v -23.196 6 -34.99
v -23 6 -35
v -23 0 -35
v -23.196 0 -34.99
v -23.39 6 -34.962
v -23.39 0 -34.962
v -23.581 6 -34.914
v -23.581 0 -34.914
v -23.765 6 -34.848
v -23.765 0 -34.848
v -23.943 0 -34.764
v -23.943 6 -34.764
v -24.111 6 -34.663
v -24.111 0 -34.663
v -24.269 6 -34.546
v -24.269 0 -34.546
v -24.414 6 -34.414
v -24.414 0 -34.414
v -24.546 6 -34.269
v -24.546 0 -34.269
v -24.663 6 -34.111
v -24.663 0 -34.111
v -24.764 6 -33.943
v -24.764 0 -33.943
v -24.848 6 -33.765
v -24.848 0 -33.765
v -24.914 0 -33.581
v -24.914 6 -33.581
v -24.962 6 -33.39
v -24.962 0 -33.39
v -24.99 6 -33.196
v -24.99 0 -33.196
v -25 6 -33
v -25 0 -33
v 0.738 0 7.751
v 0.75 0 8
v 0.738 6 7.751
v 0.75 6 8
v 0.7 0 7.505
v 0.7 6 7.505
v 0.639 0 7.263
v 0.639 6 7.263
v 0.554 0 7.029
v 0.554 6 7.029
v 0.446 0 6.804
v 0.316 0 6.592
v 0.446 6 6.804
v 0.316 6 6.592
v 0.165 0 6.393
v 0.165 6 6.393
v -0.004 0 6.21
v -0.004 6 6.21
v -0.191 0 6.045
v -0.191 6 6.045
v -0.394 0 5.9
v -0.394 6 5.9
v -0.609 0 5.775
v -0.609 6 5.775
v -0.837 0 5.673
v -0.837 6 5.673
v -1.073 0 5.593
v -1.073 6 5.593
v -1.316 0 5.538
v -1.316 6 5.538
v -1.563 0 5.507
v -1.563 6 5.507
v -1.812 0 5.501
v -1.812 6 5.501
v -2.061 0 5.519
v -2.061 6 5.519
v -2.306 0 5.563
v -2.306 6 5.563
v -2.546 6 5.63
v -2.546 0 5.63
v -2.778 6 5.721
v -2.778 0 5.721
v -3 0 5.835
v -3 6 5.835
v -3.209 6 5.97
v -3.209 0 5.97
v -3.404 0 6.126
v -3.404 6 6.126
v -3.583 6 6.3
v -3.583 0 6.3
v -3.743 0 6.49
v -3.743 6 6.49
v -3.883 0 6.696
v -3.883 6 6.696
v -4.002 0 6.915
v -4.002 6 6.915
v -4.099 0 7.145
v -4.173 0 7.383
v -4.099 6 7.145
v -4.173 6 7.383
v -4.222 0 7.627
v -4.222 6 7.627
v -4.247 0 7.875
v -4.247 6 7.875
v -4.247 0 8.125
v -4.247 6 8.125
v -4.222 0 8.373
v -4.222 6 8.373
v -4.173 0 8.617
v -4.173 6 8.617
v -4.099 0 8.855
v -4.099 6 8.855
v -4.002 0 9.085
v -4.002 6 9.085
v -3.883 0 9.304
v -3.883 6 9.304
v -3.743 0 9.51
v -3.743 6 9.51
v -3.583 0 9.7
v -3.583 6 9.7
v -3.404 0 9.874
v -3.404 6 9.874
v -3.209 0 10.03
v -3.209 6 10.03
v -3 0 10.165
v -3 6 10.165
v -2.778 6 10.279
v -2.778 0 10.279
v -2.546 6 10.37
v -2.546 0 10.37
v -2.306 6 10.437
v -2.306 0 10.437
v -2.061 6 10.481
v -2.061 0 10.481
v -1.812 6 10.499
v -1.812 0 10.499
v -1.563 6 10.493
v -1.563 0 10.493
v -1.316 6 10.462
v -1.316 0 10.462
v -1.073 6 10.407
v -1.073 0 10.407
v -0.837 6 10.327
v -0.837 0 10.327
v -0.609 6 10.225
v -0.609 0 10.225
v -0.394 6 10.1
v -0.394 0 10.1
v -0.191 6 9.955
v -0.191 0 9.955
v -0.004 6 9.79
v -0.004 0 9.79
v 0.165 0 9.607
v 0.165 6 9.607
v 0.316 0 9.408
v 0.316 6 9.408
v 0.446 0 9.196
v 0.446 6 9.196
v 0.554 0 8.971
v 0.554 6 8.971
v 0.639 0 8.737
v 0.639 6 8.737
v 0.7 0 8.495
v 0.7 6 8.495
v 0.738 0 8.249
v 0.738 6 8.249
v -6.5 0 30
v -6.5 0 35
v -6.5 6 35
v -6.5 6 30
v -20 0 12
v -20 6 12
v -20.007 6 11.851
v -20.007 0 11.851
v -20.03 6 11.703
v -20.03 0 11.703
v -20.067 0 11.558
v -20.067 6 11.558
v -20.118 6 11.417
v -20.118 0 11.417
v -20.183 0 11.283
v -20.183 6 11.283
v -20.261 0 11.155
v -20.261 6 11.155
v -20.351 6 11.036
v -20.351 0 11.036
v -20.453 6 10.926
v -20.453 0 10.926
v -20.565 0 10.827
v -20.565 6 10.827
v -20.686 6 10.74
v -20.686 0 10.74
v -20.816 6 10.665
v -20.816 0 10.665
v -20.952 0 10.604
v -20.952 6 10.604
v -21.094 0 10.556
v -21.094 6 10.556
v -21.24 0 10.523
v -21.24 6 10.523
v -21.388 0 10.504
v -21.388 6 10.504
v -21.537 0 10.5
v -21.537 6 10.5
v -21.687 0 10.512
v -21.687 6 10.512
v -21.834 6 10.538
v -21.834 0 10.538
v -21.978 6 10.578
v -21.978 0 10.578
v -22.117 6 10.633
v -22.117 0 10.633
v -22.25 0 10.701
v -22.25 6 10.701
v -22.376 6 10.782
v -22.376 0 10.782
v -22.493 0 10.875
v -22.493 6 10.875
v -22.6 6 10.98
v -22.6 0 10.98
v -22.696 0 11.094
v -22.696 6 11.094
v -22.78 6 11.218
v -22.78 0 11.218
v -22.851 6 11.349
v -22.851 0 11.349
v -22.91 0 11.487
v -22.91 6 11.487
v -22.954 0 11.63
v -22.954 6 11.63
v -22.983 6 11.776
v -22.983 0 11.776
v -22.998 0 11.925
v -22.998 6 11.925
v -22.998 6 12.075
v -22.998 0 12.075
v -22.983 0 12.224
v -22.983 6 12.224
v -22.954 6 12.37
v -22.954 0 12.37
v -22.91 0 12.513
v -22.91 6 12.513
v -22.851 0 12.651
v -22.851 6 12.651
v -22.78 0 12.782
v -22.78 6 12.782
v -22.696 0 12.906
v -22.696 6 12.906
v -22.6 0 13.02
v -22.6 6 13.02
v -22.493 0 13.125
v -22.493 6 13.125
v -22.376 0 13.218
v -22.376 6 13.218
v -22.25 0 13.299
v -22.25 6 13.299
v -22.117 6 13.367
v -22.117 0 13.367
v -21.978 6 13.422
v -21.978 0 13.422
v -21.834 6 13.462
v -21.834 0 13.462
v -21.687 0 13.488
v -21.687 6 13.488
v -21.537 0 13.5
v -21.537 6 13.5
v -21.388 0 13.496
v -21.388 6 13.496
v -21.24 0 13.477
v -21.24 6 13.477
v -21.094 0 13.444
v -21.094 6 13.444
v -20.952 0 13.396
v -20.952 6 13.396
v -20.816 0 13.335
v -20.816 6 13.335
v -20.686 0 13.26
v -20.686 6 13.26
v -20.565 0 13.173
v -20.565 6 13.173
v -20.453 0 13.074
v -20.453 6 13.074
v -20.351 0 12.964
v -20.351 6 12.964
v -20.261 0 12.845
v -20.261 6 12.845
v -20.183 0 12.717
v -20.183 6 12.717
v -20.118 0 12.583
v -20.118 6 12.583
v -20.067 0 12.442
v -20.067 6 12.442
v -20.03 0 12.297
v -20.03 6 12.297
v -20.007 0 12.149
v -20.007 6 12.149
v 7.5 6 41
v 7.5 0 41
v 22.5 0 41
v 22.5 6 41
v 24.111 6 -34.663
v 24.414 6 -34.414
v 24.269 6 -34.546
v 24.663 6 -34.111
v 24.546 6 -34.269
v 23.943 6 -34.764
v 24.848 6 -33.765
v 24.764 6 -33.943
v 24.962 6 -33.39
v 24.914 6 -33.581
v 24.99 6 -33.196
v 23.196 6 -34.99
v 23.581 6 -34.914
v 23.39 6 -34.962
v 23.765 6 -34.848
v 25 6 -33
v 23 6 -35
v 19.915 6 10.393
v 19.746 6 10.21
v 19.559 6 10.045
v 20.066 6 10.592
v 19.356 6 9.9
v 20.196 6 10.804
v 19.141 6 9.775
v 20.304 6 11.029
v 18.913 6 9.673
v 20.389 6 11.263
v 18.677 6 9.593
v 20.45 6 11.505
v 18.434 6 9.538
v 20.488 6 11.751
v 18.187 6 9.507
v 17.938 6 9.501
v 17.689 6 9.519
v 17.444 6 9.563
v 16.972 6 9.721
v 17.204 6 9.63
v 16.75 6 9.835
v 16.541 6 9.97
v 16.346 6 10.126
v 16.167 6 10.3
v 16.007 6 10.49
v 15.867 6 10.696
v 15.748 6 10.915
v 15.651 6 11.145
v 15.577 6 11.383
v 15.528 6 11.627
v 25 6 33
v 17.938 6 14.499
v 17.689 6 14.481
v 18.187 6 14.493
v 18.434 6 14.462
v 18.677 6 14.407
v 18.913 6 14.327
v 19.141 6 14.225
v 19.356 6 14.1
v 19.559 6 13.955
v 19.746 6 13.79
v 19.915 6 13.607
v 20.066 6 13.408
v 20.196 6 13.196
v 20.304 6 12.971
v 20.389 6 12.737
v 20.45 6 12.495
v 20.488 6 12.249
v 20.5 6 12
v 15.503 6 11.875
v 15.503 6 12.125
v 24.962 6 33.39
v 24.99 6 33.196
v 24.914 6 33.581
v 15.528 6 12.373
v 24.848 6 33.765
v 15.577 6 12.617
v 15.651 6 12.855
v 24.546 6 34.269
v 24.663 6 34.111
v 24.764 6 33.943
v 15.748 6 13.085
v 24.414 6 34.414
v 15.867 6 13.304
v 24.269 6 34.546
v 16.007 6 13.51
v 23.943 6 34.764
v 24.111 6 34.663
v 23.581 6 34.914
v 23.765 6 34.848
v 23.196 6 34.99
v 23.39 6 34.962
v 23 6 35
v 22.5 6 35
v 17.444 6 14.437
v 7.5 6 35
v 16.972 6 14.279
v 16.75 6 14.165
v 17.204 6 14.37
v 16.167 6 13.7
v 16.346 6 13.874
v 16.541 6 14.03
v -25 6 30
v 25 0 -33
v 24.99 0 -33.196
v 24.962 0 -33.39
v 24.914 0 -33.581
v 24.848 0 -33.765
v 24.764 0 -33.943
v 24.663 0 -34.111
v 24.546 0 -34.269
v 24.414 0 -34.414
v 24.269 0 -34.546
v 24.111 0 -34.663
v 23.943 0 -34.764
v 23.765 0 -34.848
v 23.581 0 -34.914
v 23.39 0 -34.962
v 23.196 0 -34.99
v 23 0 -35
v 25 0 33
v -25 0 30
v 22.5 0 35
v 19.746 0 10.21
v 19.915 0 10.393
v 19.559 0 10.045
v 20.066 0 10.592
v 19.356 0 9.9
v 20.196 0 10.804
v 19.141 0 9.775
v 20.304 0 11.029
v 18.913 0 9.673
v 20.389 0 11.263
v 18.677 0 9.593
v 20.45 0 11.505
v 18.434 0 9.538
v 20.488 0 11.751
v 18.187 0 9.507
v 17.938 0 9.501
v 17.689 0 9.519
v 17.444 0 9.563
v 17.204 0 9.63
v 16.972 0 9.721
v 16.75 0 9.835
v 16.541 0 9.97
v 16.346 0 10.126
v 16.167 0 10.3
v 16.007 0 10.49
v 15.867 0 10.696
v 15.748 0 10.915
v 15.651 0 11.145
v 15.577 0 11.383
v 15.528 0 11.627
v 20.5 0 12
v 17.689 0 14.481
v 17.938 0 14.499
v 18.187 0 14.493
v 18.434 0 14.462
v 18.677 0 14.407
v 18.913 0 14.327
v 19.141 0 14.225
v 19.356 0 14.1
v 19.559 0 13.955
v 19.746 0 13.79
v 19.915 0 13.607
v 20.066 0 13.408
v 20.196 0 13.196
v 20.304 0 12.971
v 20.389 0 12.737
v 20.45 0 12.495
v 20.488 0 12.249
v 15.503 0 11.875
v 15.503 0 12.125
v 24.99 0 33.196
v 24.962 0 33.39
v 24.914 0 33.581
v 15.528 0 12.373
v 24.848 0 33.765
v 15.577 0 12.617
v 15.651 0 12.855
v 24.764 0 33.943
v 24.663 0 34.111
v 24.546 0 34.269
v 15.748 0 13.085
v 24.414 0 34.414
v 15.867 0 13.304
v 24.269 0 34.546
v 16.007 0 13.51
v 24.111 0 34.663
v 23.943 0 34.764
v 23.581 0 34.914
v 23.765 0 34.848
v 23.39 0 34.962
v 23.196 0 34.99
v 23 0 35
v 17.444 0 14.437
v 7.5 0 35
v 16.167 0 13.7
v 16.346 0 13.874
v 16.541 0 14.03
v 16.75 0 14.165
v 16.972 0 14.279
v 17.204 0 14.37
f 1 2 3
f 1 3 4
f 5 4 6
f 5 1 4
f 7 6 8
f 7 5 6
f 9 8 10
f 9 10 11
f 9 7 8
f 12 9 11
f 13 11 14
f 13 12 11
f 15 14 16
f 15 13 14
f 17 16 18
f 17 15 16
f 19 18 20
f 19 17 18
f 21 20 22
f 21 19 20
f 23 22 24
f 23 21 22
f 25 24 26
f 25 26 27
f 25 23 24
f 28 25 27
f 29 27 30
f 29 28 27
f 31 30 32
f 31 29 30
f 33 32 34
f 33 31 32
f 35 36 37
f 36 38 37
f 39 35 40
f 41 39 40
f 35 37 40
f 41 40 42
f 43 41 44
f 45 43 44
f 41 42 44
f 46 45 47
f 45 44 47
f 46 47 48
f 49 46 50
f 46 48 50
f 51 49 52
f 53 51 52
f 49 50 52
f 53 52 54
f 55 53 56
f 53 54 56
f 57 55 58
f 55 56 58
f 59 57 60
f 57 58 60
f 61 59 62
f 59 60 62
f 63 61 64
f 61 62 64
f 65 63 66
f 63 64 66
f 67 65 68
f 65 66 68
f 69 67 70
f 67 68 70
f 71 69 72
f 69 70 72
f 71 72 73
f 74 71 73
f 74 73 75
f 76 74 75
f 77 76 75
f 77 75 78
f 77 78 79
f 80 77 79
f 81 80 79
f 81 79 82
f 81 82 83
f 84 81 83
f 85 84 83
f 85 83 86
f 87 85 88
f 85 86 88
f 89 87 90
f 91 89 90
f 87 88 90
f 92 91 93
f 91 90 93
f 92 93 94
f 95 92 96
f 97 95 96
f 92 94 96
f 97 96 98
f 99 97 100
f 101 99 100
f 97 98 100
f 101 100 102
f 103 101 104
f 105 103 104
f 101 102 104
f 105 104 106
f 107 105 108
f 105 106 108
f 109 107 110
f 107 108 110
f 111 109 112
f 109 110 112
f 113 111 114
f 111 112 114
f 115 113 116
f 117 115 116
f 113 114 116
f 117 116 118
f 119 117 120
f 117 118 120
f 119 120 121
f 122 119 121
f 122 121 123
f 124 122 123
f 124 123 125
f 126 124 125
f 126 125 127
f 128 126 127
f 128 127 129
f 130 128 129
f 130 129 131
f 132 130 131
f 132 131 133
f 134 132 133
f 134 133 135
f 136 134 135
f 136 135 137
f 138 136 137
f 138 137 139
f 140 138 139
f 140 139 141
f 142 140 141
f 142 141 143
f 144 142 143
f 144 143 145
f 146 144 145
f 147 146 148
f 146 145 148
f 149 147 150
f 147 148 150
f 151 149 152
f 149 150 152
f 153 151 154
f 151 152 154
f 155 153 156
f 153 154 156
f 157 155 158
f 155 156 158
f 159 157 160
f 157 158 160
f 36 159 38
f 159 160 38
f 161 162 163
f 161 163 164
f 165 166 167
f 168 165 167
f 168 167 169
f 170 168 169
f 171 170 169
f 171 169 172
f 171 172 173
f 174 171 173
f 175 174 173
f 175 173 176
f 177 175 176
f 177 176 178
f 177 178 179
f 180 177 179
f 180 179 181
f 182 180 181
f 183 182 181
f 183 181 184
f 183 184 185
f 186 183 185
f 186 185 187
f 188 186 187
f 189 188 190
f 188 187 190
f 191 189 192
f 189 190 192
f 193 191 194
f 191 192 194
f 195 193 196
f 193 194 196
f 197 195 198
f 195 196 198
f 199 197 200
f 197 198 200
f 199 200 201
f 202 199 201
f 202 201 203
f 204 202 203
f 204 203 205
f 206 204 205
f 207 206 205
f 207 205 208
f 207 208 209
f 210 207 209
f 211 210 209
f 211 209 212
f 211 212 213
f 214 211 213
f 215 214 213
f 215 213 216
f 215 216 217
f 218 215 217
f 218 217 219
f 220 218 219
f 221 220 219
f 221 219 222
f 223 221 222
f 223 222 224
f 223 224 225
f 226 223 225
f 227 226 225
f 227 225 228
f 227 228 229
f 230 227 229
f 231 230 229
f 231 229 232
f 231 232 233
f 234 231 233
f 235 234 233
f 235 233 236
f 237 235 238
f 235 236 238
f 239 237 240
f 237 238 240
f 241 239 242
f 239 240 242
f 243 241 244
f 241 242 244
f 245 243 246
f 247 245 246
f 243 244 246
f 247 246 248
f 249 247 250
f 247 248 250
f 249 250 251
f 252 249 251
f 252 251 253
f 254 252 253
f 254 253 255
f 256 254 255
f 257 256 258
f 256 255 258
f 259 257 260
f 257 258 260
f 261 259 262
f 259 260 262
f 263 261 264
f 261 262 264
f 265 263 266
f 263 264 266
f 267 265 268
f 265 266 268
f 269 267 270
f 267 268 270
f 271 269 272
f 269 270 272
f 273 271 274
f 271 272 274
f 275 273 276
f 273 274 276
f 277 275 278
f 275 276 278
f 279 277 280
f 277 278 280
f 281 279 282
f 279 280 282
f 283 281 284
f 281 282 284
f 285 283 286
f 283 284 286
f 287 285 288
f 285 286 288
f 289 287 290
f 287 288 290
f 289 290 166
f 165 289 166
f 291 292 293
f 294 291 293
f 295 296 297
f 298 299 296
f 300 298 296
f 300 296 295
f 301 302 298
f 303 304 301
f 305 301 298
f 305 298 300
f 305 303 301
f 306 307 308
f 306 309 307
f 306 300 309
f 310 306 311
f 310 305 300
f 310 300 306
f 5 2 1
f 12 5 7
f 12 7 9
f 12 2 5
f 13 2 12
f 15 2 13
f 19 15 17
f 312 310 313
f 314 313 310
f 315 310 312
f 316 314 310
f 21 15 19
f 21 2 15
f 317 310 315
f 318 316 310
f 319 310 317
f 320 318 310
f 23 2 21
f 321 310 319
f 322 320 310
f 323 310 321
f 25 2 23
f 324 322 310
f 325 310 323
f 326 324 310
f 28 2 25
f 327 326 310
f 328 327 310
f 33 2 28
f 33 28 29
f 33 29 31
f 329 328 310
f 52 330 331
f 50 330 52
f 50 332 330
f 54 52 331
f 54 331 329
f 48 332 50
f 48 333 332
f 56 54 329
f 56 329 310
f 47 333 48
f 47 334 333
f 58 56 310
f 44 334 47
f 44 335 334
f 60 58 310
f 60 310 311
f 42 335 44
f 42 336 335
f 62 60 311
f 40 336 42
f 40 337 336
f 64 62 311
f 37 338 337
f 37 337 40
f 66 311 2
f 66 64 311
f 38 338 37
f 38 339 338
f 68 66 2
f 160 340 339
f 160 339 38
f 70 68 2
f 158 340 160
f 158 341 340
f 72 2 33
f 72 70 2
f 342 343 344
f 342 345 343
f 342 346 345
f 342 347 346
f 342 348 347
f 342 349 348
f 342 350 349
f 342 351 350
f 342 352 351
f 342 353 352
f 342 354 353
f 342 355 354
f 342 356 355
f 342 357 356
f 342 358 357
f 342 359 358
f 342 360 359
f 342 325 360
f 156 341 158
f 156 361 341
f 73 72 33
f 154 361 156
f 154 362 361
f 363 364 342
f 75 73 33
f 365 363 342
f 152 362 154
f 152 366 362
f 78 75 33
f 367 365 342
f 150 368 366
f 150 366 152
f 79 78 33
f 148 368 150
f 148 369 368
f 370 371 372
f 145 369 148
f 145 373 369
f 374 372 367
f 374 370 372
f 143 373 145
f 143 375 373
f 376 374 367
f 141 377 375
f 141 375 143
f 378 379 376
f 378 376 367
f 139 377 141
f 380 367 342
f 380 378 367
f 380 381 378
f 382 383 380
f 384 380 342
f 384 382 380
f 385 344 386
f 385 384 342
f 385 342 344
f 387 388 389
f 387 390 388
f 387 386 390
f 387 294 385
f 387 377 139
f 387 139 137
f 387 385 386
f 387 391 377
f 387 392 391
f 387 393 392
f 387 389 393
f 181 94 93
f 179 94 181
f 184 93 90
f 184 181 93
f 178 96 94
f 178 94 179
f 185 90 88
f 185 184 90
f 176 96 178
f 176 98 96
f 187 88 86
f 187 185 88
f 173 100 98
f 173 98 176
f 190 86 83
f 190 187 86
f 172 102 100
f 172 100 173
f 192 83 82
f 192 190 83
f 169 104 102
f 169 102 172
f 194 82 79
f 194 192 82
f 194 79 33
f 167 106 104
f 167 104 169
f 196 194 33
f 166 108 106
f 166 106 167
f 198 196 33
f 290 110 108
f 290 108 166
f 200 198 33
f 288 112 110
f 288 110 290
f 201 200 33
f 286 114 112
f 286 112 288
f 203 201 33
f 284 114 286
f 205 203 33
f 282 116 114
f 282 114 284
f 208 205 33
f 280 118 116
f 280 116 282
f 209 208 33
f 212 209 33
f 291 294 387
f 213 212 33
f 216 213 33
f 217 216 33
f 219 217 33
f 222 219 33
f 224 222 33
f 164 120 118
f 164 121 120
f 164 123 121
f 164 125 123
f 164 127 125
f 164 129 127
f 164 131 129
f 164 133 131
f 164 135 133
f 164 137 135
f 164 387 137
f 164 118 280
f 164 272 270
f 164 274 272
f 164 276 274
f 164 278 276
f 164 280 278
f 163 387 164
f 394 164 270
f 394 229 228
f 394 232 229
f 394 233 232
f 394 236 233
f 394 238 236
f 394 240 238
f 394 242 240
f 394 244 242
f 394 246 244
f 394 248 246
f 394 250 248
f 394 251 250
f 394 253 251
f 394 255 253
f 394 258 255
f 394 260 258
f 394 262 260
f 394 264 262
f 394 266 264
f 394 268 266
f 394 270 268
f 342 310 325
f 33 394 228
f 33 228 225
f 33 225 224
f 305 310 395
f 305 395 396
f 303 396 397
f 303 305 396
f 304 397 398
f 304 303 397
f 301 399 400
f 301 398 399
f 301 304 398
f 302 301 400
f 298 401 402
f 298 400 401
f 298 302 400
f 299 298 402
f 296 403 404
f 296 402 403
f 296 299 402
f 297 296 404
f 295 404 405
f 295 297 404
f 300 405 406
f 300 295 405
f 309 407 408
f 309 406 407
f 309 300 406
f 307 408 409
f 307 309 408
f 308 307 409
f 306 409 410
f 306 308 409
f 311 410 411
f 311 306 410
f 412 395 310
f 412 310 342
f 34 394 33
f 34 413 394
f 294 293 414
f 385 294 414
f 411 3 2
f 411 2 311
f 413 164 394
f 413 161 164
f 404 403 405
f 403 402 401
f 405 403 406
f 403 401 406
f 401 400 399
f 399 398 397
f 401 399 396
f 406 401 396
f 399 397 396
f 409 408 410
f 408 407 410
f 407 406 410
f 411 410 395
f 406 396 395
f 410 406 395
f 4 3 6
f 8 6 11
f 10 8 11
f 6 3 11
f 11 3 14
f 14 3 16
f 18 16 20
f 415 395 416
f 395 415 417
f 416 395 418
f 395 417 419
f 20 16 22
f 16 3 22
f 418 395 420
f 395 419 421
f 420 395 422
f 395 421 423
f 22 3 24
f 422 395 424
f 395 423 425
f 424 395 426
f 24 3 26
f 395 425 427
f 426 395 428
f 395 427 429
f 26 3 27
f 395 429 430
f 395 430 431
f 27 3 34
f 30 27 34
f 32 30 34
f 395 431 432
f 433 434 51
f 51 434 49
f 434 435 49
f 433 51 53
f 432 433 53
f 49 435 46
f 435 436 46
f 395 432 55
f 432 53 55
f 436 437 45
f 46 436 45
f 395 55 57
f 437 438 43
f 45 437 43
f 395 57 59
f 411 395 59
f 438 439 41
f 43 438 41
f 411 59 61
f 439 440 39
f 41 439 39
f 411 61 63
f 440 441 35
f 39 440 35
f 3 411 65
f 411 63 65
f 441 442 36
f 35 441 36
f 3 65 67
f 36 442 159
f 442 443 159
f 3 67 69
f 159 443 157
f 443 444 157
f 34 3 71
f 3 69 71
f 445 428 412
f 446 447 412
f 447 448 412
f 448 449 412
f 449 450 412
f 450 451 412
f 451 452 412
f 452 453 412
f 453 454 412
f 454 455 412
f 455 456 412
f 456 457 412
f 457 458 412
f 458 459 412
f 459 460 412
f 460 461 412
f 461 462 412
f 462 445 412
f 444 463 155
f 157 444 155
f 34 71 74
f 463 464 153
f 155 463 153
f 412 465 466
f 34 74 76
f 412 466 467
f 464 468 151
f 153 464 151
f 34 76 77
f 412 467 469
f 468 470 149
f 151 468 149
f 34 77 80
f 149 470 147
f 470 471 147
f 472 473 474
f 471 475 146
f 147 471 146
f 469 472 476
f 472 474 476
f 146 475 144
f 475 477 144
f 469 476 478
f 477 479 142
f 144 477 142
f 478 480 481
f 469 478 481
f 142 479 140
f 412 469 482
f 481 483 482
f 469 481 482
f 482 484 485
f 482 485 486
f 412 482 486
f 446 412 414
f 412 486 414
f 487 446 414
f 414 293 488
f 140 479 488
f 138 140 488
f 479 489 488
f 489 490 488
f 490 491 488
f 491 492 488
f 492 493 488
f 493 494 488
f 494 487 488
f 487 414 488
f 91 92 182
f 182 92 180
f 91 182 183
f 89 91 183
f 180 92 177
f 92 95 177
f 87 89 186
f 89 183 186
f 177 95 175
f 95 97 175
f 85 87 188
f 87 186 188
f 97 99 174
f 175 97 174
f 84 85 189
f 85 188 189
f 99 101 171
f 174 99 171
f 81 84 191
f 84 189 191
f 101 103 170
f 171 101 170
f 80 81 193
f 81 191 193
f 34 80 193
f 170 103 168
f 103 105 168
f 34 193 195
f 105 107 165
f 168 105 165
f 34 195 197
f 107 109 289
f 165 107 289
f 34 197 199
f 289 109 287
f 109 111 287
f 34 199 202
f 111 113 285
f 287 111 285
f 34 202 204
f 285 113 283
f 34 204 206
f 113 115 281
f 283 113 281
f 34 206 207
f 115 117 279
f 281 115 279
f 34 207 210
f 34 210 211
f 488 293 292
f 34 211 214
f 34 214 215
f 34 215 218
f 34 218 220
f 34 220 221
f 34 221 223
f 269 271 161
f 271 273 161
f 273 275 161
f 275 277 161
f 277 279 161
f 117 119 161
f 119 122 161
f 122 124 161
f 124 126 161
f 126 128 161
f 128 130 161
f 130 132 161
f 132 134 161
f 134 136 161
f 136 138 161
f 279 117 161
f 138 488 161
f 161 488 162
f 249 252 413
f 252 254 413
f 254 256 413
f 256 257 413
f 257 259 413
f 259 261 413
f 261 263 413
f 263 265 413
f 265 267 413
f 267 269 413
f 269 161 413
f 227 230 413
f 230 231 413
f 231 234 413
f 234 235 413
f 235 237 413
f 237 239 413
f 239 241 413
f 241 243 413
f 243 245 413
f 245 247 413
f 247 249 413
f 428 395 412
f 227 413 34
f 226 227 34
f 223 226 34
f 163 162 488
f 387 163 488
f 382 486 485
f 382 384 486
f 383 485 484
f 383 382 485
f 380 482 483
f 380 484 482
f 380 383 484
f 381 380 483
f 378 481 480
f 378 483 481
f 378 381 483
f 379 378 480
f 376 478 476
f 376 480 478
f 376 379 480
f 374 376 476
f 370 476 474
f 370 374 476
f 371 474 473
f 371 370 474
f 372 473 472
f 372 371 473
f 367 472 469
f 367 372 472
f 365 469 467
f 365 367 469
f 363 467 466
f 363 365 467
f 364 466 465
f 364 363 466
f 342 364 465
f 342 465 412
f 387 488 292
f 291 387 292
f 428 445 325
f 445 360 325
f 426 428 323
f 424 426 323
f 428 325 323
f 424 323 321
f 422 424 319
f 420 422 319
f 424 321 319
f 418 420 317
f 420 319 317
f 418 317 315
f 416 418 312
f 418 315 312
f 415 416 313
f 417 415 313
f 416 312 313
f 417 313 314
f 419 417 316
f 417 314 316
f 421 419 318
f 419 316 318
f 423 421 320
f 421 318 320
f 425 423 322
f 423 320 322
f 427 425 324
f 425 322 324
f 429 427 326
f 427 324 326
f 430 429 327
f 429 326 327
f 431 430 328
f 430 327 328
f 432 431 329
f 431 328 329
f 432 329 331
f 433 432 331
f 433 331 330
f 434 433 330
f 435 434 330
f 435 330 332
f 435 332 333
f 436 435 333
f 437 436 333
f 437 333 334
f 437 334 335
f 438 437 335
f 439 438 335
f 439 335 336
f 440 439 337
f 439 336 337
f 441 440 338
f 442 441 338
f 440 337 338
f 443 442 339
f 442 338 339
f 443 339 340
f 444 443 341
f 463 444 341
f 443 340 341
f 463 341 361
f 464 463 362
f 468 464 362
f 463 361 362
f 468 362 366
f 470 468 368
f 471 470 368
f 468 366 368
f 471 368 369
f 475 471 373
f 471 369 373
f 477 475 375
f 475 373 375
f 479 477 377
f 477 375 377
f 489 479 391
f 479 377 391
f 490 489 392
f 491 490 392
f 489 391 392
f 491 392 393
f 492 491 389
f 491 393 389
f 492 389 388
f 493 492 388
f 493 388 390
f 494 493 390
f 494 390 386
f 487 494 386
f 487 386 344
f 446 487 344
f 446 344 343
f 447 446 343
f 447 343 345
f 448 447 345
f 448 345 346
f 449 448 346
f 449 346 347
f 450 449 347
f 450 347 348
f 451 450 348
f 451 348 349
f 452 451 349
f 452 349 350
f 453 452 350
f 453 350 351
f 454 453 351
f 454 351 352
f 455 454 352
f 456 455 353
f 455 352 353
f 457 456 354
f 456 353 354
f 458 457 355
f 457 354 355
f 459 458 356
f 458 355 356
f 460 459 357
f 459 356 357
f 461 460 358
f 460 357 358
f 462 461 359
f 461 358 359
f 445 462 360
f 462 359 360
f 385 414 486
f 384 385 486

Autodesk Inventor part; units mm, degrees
ref_plane "YZ Plane" through (0, 0, 0) normal (1, 0, 0) x (0, 1, 0)
ref_plane "XZ Plane" through (0, 0, 0) normal (0, 1, 0) x (-1, 0, 0)
ref_plane "XY Plane" through (0, 0, 0) normal (0, 0, 1) x (1, 0, 0)
sketch "Sketch2" plane through (0, 0, 0) normal (0, 1, 0) x (-1, 0, 0)
  line L0 (25, -35) -> (-25, -35)
  line L1 (-25, -35) -> (-25, 35)
  line L2 (25, 30) -> (25, -35)
  line L3 (25, -35) -> (-25, 35) construction
  line L4 (-25, -35) -> (25, 35) construction
  line L5 (12, 35) -> (-3, 35)
  line L6 (6.5, 35) -> (12, 35)
  line L7 (-3, 35) -> (-25, 35)
  line L8 (25, 35) -> (6.5, 35)
  line L9 (6.5, 35) -> (6.5, 30)
  line L10 (6.5, 30) -> (25, 30)
  line L11 (25, 30) -> (25, 35)
  line L12 (-22.5, 35) -> (-7.5, 35)
  line L13 (-7.5, 35) -> (-7.5, 41)
  line L14 (-7.5, 41) -> (-22.5, 41)
  line L15 (-22.5, 41) -> (-22.5, 35)
  point P0 (0, 0)
  point P1 (0, 0)
  point P2 (-7.5, 35)
  dimension "d0" = 50
  dimension "d1" = 70
  dimension "d16" = 18.5
  dimension "d17" = 5
  dimension "d58" = 2.5
  dimension "d59" = 15
  dimension "d60" = 6
extrude "Extrusion3" add sketch "Sketch2" along normal blind 6 contours L0 L1 L7 L5 L9 L10 L2 | L15 L14 L13 L7
fillet "Fillet1" radius 2 3 edges at (25, 3, -35) (-25, 3, -35) (25, 3, 35)
sketch "Sketch4" plane through (0, 6, 0) normal (0, 1, 0) x (1, 0, 0)
  circle A0 centre (-1.75, -8) radius 2.5
  line L0 (25, -33) -> (25, 33) projected
  circle A1 centre (-21.5, -12) radius 1.5
  line L1 (-25, 33) -> (-25, -30) projected
  circle A2 centre (18, -12) radius 2.5
  line L2 (-6.5, -35) -> (7.5, -35) projected
  point P0 (0, 0)
  dimension "d31" = 5
  dimension "d34" = 3
  dimension "d41" = 5
  dimension "d44" = 19.75
  dimension "d45" = 19.75
  dimension "d46" = 7
  dimension "d61" = 23
  dimension "d62" = 27
  dimension "d63" = 23
extrude "Extrusion10" cut sketch "Sketch4" against normal through all
properties part number "Pared_caja_reduccion_MDF"
